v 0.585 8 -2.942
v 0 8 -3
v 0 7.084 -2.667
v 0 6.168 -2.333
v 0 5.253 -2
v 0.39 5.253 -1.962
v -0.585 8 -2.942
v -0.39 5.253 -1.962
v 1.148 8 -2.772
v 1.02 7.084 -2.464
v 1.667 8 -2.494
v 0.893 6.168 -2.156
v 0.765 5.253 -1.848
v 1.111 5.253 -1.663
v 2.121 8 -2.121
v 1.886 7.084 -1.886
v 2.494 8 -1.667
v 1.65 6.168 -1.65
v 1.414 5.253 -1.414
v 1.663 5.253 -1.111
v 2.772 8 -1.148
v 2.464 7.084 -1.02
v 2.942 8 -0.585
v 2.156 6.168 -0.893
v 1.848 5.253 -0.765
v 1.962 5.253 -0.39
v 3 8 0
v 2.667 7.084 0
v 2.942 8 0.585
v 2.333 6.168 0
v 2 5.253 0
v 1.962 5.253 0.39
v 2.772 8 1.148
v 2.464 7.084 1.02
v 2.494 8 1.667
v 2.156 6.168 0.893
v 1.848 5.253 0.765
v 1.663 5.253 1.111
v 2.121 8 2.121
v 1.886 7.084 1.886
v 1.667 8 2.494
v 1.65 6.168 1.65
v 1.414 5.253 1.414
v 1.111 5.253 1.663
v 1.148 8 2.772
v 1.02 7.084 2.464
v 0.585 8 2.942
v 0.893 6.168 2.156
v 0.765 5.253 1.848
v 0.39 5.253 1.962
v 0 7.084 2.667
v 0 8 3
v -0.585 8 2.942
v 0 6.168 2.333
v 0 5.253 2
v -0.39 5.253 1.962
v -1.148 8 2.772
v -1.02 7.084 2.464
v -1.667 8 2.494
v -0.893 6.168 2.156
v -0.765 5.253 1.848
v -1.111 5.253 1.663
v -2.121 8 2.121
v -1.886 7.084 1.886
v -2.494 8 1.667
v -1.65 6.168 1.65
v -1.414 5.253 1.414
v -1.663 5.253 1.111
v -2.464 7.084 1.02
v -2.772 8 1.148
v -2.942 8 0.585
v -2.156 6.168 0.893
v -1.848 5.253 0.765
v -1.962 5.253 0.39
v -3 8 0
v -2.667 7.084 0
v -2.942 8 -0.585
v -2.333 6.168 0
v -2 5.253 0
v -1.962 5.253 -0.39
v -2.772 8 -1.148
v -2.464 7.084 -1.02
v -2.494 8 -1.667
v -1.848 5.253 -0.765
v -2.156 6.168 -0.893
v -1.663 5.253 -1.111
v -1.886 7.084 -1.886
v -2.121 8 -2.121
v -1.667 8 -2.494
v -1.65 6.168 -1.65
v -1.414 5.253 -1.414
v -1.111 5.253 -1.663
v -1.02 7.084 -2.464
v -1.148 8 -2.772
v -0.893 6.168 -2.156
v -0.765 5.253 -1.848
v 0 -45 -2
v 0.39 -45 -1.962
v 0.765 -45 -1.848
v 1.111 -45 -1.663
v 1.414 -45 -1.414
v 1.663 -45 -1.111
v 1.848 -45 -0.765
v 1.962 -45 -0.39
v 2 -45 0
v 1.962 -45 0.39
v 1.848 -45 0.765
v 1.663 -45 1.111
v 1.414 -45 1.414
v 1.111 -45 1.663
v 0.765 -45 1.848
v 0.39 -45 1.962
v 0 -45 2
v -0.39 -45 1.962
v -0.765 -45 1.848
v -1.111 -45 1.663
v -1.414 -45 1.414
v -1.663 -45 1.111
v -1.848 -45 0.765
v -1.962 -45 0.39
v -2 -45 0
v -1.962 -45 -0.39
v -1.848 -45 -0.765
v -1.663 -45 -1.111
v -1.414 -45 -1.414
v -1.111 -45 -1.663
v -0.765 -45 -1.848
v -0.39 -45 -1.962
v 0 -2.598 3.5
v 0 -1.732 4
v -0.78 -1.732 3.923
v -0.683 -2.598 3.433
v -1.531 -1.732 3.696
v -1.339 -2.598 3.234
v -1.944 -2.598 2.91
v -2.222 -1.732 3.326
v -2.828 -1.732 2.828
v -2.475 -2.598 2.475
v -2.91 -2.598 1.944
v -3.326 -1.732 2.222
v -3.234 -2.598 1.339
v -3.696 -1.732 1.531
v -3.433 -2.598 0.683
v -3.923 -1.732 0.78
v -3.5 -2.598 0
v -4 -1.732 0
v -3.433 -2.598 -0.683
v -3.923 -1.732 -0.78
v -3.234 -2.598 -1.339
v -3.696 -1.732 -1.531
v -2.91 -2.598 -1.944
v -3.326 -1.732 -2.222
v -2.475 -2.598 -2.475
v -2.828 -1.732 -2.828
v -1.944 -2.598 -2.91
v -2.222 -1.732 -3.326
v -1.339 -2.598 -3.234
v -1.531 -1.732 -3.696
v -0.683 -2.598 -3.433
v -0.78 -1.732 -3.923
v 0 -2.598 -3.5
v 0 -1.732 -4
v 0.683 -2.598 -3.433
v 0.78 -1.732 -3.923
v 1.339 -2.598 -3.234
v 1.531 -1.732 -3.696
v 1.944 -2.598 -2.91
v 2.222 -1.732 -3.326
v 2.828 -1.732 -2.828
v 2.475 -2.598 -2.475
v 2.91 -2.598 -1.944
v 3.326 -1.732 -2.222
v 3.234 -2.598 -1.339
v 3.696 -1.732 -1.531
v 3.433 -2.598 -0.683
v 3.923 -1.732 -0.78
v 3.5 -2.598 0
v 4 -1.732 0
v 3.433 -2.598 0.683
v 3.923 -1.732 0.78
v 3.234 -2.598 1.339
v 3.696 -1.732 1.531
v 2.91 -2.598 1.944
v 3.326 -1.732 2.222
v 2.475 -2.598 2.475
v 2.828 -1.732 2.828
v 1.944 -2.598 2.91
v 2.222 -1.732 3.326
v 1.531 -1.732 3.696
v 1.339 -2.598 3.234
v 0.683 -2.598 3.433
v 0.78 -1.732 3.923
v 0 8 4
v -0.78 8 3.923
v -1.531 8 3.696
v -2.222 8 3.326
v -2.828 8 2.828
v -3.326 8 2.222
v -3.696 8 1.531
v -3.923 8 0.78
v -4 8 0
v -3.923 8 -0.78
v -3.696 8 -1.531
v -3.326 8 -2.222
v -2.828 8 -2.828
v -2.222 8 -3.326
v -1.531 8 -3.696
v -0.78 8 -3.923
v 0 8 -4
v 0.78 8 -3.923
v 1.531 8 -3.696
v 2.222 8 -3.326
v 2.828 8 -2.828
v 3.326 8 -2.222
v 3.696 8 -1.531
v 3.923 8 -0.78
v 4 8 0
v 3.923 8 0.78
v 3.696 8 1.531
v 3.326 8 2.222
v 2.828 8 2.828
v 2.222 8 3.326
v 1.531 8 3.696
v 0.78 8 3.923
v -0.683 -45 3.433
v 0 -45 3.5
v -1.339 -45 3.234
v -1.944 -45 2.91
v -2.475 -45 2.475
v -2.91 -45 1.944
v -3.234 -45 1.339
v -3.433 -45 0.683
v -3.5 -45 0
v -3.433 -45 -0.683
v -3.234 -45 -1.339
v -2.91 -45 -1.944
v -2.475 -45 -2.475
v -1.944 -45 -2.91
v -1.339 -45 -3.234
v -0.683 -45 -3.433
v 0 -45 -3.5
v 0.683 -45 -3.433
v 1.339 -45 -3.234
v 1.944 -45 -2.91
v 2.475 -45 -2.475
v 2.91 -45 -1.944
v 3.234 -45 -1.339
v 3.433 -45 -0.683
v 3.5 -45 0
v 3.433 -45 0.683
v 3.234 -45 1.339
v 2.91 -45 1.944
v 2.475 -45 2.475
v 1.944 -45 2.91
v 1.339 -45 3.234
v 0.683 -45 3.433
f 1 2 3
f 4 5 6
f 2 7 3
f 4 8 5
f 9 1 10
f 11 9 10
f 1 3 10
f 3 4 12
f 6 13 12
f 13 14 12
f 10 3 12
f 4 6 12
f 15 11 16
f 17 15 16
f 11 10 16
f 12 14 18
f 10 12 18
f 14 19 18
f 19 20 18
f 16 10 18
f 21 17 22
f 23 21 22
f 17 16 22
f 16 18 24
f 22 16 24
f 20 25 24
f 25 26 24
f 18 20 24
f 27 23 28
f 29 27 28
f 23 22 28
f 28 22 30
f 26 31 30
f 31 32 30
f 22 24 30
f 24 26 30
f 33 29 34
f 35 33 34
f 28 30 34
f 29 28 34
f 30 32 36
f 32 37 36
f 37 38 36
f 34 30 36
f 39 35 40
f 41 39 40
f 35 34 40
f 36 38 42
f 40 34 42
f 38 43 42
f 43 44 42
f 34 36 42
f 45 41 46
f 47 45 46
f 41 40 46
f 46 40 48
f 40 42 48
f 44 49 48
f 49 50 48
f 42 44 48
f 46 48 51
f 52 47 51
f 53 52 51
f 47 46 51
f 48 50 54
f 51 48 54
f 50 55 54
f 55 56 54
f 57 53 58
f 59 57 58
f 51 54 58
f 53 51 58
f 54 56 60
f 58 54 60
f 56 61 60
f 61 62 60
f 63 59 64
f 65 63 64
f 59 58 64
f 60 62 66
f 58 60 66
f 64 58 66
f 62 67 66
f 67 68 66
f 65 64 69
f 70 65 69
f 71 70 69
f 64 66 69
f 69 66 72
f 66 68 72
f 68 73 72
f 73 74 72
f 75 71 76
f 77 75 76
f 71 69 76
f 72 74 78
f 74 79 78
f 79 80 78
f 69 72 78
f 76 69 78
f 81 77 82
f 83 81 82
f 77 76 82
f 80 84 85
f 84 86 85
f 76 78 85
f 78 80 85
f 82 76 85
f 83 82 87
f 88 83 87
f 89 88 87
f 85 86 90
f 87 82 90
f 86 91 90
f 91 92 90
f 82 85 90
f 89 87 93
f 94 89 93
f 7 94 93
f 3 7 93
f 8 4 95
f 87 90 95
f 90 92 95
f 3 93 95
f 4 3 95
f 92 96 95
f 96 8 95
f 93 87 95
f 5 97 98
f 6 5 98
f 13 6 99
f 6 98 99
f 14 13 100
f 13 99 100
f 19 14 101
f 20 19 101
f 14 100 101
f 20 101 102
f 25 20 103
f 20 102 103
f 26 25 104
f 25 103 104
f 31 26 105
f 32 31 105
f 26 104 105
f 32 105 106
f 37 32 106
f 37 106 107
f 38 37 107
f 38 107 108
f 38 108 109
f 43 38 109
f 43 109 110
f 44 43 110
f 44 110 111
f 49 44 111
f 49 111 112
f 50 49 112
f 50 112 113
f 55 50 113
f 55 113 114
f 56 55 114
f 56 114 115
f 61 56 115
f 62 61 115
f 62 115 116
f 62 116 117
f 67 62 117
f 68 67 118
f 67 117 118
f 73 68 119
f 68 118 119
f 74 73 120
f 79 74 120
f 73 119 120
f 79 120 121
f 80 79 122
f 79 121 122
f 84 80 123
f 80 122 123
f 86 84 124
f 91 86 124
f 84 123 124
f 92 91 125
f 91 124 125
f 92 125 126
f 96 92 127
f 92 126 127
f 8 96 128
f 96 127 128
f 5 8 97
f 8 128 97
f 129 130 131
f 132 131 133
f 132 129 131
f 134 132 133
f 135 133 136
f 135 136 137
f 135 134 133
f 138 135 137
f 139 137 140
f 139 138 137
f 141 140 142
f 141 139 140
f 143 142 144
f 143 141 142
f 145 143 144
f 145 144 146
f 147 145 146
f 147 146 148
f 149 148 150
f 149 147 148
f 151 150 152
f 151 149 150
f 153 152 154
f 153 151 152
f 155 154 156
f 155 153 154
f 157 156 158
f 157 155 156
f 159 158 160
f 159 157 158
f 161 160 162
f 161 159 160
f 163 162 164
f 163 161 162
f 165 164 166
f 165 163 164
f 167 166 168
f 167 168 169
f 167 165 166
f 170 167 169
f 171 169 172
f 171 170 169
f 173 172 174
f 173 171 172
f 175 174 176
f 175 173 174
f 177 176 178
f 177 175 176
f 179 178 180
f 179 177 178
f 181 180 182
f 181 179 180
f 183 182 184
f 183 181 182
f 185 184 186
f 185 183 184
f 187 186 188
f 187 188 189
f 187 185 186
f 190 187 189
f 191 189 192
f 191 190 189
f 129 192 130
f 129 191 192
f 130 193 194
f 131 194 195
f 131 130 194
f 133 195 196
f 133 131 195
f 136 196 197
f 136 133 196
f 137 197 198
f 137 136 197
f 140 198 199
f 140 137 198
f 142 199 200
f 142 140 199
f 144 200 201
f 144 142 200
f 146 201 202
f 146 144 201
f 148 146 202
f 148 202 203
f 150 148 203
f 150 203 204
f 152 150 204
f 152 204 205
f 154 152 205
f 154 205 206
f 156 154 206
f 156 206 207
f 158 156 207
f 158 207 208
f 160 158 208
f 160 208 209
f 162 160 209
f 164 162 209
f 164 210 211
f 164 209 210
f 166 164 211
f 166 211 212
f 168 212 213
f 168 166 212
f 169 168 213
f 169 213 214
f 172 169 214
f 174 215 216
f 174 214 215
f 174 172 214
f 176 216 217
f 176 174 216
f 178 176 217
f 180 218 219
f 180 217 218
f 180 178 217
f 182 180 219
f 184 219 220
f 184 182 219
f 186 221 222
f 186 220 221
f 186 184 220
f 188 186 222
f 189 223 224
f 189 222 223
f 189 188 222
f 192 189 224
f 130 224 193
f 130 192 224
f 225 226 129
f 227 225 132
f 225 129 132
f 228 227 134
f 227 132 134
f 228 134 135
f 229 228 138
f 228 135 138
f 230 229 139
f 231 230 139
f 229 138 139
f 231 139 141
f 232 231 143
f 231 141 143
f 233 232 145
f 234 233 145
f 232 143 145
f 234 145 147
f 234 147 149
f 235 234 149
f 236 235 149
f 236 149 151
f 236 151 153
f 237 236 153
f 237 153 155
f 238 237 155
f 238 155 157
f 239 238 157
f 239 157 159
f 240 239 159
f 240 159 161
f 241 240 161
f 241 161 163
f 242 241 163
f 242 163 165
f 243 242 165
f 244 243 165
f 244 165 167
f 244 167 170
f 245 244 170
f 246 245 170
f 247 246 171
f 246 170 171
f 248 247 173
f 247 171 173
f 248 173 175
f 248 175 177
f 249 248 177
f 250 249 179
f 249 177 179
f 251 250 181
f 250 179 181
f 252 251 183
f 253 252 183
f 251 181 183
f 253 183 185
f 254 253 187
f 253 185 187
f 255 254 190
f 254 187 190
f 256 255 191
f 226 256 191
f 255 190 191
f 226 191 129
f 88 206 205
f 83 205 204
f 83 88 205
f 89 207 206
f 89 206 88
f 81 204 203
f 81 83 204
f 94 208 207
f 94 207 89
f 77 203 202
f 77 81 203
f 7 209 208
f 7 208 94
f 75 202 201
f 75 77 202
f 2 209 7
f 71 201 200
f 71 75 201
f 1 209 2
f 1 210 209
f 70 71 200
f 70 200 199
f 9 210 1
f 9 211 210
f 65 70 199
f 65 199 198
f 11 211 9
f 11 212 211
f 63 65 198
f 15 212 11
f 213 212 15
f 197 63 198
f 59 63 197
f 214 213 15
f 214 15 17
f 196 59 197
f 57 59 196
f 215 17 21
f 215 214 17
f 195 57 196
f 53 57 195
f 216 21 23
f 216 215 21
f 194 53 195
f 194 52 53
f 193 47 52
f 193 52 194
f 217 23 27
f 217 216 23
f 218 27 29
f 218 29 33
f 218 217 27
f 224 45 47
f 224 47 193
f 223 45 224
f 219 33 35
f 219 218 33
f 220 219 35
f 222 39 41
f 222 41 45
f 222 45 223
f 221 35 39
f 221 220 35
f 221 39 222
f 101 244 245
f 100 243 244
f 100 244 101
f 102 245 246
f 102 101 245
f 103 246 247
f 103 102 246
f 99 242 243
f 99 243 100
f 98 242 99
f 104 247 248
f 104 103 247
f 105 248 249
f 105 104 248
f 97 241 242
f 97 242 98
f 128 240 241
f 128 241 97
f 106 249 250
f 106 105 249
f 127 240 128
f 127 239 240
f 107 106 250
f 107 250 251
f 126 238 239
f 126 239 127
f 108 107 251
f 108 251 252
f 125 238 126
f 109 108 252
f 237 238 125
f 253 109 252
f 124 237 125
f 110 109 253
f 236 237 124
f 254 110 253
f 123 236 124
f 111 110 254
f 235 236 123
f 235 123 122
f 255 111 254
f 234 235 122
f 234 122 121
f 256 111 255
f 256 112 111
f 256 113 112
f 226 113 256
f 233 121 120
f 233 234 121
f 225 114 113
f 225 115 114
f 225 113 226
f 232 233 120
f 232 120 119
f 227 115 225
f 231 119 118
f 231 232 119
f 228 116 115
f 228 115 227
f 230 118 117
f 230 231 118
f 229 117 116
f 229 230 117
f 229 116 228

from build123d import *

# Parameters (mm, degrees)
SKETCH_1_R          = 4
EXTRUDE_1_DEPTH     = 8
SKETCH_2_R          = 3.5
EXTRUDE_2_DEPTH     = 45
CHAMFER_1_SIZE      = 1.5
CHAMFER_1_SIZE_2    = 2.598076211
SKETCH_3_R          = 2
CUT_EXTRUDE_1_DEPTH = 101
CHAMFER_2_SIZE      = 1
CHAMFER_2_SIZE2     = 2.747477419


with BuildPart() as part:
    # 草图1 → 凸台-拉伸1 (new body)
    with BuildSketch(Plane(origin=(0, 0, 0), x_dir=(1, 0, 0), z_dir=(0, 1, 0))):
        with Locations(Location((0, 0, 0), (0, 0, 270))):
            Circle(SKETCH_1_R)
    extrude(amount=EXTRUDE_1_DEPTH)

    # 草图2 → 凸台-拉伸2 (add)
    with BuildSketch(Plane.XZ):
        with Locations(Location((0, 0, 0), (0, 0, 90))):
            Circle(SKETCH_2_R)
    extrude(amount=EXTRUDE_2_DEPTH)

    # 倒角1
    # the kernel refuses this chamfer: 2.598076211, 1.5 mm, written as the material it adds along each edge
    with BuildSketch(Plane(origin=(0, 0, 0), x_dir=(0, 0, 1), z_dir=(1, 0, 0))) as chamfer_1_piece_1_section:
        Polygon((3.5 + CHAMFER_1_SIZE, 0), (3.5, CHAMFER_1_SIZE_2), (3.5, 0), align=None)
    chamfer_1_piece_1 = revolve(axis=Axis((0, 0, 0), (0, -1, 0)), mode=Mode.PRIVATE)
    chamfer_1_piece_1 = chamfer_1_piece_1 & Plane(origin=(0, -2.194625368, 0), x_dir=(0, 0, 1), z_dir=(0, -1, 0)) * Cylinder(4, 20, mode=Mode.PRIVATE)
    add(chamfer_1_piece_1)

    # 草图3 → 切除-拉伸1 (cut)
    with BuildSketch(Plane.XZ.offset(45)):
        with Locations(Location((0, 0, 0), (0, 0, 270))):
            Circle(SKETCH_3_R)
    extrude(amount=-CUT_EXTRUDE_1_DEPTH, mode=Mode.SUBTRACT)

    # 倒角2
    chamfer_2_edges = [part.edges().sort_by_distance(p)[0] for p in [
        (0, 8, 2),
    ]]
    chamfer_2_side = [part.faces().sort_by_distance(p)[0] for p in [
        (0, 8, -3.886862915),
    ]]
    chamfer(chamfer_2_edges, length=CHAMFER_2_SIZE, length2=CHAMFER_2_SIZE2, reference=chamfer_2_side[0])


solid = part.part
